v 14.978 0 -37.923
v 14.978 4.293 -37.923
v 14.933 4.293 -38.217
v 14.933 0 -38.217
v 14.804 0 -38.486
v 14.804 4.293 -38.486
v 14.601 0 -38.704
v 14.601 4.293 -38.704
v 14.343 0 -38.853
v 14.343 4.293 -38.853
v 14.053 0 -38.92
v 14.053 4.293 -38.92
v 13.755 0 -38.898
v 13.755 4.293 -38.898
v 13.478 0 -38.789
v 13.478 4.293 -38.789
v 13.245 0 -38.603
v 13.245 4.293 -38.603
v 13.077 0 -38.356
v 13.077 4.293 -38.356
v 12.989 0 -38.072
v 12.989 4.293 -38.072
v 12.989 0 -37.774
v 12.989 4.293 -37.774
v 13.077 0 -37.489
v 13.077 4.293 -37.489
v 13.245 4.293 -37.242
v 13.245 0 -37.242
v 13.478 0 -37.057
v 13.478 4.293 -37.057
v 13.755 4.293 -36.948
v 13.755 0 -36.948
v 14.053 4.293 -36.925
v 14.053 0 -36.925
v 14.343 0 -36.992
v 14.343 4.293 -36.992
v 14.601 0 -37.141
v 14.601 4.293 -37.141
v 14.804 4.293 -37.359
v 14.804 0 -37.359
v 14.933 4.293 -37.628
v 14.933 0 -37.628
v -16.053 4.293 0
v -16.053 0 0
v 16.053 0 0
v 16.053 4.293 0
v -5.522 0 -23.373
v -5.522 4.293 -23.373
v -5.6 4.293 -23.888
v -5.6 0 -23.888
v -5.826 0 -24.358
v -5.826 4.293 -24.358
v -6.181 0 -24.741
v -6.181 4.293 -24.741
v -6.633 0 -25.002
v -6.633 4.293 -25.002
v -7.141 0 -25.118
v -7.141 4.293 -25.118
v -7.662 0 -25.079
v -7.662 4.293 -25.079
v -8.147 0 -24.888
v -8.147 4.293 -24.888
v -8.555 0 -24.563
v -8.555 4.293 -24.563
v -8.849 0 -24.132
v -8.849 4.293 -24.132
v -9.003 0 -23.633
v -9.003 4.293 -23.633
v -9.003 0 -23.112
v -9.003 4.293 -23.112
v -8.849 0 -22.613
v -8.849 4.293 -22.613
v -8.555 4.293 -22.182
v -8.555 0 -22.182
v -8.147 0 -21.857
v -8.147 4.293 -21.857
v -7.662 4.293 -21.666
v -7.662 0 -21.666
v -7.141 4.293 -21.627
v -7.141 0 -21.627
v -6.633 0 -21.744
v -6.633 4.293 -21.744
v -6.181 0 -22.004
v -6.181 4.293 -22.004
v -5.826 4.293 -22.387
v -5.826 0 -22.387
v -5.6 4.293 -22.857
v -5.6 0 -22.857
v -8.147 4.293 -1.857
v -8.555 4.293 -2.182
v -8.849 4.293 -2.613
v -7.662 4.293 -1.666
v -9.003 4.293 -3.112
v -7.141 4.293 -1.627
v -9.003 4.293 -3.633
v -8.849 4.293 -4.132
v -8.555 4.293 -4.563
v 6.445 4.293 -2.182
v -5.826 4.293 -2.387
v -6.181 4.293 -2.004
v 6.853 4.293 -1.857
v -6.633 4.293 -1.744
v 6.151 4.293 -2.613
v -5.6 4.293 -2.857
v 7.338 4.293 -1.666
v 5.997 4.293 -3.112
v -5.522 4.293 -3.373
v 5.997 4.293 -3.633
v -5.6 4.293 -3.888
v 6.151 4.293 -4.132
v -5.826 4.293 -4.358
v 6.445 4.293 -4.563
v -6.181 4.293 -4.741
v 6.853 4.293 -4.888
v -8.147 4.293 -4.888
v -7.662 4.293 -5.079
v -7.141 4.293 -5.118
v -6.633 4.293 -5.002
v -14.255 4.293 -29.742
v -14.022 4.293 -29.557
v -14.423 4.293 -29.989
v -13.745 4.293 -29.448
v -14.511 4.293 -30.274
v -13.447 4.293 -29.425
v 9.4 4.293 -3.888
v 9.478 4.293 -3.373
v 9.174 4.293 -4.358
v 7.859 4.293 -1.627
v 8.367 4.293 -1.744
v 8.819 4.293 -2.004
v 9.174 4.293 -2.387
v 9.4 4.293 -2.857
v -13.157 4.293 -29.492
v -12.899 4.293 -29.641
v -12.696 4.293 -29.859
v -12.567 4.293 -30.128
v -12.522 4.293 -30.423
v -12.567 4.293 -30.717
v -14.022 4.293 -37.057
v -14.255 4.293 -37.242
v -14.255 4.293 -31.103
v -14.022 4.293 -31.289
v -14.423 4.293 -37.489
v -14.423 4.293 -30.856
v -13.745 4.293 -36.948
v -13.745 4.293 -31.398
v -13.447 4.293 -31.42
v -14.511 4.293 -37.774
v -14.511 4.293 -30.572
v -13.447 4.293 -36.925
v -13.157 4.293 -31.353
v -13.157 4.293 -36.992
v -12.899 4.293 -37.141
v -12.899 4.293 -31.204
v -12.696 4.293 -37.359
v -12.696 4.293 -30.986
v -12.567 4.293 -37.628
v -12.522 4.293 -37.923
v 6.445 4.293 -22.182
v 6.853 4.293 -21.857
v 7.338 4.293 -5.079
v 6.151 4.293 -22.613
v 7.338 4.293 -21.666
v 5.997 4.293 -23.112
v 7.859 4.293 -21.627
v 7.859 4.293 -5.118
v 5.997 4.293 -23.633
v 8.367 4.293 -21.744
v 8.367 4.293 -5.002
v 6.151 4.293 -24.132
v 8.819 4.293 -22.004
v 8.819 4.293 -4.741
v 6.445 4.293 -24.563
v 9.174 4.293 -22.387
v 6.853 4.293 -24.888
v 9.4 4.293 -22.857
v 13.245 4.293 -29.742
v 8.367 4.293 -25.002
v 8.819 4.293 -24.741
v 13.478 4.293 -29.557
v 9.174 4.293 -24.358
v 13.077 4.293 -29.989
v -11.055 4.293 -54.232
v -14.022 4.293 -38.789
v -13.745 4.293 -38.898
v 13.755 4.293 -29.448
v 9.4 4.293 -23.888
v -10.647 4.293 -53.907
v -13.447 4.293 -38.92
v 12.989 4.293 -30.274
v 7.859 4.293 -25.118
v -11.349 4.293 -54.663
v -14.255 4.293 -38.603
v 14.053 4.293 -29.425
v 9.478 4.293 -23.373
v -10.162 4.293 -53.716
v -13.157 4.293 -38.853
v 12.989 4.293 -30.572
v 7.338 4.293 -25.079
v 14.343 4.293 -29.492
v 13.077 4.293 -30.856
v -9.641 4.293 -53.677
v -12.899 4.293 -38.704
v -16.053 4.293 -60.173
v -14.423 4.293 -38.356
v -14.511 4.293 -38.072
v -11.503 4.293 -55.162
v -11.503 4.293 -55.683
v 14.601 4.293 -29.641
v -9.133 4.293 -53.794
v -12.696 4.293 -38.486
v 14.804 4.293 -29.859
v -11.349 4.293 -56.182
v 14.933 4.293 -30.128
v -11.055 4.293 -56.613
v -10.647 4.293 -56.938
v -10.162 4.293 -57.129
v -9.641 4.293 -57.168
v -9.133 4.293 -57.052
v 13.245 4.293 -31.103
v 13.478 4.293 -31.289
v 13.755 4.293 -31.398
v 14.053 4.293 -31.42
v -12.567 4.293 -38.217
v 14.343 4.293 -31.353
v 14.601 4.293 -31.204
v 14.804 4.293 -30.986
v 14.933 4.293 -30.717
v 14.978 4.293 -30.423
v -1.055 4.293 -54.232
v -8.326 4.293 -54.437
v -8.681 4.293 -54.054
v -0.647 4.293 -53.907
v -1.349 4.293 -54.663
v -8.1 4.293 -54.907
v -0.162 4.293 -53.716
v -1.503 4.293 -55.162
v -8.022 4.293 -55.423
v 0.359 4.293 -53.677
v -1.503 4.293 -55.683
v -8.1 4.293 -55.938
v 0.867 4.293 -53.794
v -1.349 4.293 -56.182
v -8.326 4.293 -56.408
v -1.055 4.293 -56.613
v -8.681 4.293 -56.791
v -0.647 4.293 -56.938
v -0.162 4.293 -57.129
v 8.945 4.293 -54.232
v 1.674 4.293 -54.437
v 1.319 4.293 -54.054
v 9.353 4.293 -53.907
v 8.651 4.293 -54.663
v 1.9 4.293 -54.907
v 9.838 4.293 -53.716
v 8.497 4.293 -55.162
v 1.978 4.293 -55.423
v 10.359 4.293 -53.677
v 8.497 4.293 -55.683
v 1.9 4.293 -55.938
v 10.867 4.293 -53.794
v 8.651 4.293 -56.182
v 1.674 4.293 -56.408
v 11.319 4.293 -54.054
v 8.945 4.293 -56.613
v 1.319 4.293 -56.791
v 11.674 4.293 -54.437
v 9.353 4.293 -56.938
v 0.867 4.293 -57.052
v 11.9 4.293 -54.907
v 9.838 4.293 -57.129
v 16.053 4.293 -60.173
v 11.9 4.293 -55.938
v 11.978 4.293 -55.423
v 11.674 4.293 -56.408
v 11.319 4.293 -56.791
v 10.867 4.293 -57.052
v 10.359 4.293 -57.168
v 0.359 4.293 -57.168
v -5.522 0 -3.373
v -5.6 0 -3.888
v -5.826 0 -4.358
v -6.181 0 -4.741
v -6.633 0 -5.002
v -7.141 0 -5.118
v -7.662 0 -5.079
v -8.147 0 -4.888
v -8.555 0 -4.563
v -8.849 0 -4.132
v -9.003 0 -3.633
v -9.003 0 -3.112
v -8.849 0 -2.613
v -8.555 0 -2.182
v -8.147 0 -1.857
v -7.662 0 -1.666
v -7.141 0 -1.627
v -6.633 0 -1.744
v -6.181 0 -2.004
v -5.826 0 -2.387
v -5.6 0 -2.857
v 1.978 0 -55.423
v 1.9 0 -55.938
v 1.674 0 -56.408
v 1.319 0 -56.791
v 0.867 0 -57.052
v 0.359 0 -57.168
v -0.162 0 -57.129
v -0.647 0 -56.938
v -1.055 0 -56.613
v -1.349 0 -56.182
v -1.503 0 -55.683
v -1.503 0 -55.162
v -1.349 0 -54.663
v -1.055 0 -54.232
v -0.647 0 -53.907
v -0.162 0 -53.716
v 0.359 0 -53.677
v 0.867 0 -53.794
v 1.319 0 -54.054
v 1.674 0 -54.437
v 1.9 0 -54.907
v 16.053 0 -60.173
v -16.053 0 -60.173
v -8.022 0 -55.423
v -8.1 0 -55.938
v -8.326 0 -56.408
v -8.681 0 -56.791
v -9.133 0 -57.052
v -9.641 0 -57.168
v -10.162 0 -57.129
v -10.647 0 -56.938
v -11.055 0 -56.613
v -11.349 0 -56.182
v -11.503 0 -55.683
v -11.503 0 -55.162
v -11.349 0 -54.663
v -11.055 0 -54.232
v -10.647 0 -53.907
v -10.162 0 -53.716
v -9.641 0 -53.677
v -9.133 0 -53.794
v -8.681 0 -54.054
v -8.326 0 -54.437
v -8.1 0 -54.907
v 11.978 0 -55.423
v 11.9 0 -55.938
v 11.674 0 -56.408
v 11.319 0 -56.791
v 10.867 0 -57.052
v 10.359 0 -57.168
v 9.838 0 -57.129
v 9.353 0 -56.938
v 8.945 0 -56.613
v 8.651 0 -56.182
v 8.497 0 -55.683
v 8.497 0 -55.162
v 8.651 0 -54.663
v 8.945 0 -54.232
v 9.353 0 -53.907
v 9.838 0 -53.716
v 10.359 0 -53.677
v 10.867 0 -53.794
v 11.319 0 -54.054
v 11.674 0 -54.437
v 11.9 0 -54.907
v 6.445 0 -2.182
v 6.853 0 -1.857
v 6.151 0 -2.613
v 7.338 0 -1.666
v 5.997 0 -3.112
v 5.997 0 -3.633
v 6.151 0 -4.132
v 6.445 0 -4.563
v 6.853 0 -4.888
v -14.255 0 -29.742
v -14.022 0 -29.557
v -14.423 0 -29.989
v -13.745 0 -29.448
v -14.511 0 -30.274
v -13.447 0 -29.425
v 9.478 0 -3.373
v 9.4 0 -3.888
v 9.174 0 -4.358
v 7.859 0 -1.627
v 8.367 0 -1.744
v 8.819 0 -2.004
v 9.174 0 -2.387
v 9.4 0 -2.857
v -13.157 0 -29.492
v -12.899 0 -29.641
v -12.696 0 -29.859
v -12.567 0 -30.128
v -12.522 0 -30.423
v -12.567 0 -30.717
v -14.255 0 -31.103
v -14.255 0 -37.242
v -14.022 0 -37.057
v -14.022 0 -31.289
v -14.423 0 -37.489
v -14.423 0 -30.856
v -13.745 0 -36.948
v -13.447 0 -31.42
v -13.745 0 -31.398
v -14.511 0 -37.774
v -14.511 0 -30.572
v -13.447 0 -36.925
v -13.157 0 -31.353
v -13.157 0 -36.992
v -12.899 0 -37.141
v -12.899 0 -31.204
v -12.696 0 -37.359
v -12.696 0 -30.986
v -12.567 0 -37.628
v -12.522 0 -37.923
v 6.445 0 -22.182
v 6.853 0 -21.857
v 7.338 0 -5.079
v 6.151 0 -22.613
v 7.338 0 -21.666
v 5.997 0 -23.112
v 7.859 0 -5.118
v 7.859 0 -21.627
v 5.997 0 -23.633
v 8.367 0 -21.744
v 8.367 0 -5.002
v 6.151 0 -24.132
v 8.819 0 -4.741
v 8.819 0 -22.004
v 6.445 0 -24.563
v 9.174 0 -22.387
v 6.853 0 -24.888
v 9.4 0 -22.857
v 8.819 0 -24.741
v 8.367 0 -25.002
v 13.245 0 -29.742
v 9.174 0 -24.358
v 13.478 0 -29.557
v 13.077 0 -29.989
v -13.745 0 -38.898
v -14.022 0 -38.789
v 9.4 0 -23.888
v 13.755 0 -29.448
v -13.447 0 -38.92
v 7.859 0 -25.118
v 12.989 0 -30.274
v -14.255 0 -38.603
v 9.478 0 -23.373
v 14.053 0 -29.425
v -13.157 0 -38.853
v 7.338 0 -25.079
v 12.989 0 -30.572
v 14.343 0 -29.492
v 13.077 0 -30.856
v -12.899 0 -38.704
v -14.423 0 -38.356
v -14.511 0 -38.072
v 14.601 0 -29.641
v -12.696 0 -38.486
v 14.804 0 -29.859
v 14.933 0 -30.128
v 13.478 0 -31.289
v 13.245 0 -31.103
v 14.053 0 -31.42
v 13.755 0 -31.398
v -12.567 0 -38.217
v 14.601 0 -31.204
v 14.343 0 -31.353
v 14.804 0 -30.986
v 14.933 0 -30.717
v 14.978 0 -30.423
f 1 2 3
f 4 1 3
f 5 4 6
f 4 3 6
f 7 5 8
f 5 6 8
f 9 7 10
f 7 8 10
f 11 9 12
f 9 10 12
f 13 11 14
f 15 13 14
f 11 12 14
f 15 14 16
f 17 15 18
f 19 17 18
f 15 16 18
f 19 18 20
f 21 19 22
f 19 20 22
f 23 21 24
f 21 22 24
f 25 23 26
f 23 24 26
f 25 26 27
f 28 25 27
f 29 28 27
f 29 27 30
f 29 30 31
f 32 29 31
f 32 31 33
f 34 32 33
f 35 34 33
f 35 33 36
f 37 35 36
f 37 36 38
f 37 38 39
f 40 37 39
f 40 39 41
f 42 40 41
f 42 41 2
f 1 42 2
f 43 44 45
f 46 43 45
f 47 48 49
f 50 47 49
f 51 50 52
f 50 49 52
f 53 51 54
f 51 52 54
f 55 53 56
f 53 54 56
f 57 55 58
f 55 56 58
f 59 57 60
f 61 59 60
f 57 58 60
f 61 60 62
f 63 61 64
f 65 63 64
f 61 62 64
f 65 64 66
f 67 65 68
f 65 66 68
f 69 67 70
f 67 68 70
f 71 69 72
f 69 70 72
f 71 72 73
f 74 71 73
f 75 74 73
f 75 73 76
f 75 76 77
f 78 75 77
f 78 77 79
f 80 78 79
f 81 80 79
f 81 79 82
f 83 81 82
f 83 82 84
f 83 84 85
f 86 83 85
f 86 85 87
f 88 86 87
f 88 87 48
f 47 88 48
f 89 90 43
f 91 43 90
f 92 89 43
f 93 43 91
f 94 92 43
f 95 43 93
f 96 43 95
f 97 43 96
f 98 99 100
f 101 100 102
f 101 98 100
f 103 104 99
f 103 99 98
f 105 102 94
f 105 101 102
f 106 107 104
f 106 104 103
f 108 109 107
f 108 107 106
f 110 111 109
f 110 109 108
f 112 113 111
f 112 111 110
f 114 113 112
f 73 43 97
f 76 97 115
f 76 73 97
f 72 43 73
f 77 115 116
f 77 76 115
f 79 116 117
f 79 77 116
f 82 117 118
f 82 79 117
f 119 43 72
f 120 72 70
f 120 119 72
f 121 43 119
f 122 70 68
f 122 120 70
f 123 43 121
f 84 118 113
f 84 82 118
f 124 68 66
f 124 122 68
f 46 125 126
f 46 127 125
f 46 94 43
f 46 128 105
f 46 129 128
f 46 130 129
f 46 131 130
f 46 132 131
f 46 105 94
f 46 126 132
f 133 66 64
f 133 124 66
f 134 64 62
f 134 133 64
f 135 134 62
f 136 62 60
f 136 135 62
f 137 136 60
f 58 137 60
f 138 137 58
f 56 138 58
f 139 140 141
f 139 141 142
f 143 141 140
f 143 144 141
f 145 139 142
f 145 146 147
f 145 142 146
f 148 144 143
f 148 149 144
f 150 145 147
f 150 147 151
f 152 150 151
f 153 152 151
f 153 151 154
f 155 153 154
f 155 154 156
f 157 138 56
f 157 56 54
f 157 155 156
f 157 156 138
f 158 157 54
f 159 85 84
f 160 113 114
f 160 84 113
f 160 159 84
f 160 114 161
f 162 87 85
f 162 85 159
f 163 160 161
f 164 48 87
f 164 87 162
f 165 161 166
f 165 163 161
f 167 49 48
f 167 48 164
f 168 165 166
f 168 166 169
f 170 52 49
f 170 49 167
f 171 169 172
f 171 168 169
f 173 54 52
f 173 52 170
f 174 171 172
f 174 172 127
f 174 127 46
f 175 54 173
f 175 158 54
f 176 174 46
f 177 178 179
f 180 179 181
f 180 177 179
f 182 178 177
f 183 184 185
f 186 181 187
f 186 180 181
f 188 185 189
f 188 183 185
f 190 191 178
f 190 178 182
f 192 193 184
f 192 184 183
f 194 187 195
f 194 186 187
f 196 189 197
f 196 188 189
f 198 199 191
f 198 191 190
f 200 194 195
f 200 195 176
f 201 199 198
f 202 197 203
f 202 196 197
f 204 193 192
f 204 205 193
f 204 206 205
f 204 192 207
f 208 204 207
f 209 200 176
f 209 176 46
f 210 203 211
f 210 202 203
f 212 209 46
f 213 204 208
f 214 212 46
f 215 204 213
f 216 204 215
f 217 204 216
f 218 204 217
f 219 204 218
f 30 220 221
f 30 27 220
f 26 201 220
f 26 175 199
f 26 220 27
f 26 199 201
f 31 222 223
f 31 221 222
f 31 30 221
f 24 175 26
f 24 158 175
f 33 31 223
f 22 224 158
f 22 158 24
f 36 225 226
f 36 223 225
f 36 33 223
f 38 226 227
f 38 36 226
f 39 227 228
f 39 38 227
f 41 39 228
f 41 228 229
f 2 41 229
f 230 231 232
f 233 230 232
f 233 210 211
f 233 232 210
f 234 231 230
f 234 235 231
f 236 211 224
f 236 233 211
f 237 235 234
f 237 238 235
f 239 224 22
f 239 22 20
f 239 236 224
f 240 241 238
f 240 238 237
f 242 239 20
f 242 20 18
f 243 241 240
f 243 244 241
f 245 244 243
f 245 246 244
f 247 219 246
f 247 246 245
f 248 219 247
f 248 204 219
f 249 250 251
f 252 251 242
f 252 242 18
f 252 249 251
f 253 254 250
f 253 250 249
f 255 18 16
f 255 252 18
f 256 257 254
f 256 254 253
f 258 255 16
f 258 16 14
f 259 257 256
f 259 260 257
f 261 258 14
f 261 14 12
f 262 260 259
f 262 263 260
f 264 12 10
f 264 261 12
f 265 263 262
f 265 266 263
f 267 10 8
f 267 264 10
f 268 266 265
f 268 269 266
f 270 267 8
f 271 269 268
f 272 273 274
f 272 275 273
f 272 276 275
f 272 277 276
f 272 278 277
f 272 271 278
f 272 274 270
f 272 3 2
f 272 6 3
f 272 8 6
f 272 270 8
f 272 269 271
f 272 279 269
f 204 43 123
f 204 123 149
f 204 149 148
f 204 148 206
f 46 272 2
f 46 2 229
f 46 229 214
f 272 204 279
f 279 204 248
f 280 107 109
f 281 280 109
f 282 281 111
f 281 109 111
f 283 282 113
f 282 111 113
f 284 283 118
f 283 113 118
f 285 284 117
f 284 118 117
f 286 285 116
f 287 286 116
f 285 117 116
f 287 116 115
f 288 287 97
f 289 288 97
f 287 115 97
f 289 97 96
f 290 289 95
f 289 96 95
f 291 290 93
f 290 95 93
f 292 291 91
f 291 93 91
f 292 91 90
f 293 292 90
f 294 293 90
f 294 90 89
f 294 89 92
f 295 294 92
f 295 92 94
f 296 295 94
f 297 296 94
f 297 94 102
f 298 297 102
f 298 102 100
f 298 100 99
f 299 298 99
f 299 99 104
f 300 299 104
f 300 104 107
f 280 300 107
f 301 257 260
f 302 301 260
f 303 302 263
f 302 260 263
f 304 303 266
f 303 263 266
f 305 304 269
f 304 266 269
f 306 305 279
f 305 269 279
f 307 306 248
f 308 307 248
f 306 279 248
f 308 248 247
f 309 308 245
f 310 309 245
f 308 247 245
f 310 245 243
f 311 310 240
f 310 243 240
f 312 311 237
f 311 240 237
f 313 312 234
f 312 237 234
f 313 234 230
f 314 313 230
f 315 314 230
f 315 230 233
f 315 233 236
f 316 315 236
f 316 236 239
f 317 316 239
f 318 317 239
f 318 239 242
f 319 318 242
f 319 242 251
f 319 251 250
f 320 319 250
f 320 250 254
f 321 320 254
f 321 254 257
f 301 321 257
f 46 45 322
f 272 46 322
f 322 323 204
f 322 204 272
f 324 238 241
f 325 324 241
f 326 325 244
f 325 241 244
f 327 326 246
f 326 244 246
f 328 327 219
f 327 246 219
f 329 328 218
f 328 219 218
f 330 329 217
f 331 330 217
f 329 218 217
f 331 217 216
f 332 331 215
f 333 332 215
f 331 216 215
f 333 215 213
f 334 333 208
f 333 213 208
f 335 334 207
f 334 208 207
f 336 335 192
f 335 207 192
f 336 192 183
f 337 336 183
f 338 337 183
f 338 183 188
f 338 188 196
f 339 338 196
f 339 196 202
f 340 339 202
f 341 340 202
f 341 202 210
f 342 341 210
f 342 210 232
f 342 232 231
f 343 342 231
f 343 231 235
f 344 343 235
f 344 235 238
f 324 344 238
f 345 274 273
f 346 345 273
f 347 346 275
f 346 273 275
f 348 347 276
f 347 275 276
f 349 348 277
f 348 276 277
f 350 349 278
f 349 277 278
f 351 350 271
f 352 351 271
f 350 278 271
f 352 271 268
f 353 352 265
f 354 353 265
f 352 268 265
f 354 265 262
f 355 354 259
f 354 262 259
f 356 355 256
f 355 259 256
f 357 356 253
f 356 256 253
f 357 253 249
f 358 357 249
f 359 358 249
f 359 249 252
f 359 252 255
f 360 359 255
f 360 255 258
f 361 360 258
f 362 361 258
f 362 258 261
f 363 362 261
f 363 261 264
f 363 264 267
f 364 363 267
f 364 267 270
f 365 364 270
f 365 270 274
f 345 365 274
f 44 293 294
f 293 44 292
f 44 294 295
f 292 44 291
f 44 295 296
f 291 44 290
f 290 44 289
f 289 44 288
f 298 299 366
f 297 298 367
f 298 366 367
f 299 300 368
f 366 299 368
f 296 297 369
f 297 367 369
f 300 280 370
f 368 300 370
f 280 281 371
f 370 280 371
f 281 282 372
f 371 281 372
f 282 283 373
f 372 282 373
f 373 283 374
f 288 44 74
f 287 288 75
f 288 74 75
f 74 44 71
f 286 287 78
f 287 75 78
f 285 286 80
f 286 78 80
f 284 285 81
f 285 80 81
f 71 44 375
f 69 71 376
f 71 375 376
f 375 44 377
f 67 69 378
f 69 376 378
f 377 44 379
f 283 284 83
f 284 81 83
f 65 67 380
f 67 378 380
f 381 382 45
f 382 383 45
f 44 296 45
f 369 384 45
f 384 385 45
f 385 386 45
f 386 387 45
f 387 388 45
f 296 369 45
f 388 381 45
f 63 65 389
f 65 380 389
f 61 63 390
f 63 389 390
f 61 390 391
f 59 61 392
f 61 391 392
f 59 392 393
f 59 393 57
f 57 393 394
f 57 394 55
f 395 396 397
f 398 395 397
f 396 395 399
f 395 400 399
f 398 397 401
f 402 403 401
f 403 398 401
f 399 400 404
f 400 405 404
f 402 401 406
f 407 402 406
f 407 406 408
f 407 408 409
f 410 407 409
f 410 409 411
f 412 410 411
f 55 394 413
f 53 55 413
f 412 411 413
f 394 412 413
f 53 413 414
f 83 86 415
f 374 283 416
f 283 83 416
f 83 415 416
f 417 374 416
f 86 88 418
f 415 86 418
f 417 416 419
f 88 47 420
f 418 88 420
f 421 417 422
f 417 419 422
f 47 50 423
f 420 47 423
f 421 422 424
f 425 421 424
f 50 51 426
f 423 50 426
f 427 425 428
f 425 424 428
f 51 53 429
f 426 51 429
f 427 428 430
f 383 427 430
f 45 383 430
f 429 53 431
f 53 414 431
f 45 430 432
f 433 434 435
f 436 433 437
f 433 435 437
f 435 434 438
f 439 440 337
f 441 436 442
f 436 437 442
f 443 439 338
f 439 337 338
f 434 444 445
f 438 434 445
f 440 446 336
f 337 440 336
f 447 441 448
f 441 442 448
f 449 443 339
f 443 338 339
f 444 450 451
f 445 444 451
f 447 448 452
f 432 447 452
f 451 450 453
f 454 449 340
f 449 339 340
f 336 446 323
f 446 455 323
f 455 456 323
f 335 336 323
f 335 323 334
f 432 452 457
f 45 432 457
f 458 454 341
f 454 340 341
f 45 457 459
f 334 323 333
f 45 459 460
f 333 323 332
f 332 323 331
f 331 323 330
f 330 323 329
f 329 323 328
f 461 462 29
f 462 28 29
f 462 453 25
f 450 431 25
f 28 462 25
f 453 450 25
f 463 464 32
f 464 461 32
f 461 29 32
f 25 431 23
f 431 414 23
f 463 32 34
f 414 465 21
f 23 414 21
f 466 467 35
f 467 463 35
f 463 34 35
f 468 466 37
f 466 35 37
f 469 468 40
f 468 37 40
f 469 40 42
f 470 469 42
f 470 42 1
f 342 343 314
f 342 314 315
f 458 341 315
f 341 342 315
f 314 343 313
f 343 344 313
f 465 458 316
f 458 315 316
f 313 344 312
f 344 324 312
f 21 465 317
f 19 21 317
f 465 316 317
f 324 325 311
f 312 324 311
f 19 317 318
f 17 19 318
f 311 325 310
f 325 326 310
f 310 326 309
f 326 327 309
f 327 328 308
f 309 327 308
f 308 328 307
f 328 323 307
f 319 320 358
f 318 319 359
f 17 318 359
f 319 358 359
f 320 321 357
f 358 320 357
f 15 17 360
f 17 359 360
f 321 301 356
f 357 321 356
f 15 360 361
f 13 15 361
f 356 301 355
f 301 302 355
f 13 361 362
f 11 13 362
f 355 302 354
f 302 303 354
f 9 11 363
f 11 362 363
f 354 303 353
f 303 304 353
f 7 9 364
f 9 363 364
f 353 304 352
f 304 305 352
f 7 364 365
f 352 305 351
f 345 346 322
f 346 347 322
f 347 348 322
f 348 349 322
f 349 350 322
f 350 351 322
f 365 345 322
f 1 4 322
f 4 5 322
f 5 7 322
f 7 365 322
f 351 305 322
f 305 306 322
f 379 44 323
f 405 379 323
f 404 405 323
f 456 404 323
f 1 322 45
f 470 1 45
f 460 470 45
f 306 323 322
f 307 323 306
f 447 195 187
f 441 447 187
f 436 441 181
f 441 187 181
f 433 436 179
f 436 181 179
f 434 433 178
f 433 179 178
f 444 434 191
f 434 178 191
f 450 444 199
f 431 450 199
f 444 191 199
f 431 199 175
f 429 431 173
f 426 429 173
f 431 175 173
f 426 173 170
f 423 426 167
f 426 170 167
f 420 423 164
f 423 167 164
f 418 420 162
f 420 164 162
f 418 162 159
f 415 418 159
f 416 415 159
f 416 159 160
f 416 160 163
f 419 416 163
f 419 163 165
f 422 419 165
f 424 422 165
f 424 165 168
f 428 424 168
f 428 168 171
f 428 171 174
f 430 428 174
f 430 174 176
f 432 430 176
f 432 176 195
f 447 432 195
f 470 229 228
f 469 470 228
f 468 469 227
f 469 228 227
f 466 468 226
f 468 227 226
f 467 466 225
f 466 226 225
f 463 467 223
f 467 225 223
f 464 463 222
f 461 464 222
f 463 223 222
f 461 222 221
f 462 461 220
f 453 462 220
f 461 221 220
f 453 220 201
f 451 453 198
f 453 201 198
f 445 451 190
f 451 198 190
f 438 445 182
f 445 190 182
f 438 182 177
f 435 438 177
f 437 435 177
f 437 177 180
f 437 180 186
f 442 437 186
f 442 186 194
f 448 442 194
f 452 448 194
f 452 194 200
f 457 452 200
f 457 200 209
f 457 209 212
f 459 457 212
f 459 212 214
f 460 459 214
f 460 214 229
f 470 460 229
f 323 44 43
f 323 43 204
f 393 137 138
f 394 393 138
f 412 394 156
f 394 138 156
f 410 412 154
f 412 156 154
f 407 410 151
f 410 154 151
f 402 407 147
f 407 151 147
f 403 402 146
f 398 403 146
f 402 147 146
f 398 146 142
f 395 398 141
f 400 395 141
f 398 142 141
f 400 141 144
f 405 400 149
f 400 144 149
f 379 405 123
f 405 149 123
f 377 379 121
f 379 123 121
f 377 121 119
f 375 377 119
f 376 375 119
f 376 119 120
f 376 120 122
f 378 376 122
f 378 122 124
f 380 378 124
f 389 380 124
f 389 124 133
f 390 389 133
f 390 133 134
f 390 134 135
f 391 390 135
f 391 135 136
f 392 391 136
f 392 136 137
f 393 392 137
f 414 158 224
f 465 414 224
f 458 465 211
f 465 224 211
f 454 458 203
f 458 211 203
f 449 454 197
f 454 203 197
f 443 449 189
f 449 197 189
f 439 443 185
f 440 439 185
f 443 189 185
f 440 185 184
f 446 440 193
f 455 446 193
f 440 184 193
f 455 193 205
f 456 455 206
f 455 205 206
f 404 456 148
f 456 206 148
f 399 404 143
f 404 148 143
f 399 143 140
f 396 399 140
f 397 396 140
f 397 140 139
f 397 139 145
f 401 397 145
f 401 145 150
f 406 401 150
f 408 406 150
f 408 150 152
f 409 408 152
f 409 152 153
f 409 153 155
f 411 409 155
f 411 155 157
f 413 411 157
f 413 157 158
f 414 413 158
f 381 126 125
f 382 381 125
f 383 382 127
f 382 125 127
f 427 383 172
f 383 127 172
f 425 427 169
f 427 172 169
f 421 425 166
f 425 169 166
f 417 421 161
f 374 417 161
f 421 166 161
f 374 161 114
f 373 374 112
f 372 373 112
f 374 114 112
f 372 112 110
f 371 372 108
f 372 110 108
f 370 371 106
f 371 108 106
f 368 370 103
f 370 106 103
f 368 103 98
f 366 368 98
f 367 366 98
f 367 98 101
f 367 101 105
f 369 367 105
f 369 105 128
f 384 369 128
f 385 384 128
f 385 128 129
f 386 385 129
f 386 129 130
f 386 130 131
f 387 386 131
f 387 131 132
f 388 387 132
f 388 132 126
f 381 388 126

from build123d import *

# Parameters (mm, degrees)
SKETCH1_W           = 32.1056
SKETCH1_H           = 60.1726
BOSS_EXTRUDE1_DEPTH = 4.2926
SKETCH2_R           = 1.75
SKETCH2_R_2         = 1
CUT_EXTRUDE1_DEPTH  = 5.2926


with BuildPart() as part:
    # Sketch1 → Boss-Extrude1 (new body)
    with BuildSketch(Plane(origin=(0, 0, 0), x_dir=(1, 0, 0), z_dir=(0, 1, 0))):
        with Locations((0, 30.0863)):
            Rectangle(SKETCH1_W, SKETCH1_H)
    extrude(amount=BOSS_EXTRUDE1_DEPTH)

    # Sketch2 → Cut-Extrude1 (cut, through all)
    with BuildSketch(Plane(origin=(0, 4.2926, 0), x_dir=(1, 0, 0), z_dir=(0, 1, 0))):
        with Locations((-9.772224543, 55.4226)):
            Circle(SKETCH2_R)
        with Locations((0.227775457, 55.4226)):
            Circle(SKETCH2_R)
        with Locations((10.227775457, 55.4226)):
            Circle(SKETCH2_R)
        with Locations((-7.272224543, 3.3726)):
            Circle(SKETCH2_R)
        with Locations((-7.272224543, 23.3726)):
            Circle(SKETCH2_R)
        with Locations((7.727775457, 23.3726)):
            Circle(SKETCH2_R)
        with Locations((7.727775457, 3.3726)):
            Circle(SKETCH2_R)
        with Locations((13.977775457, 30.4226)):
            Circle(SKETCH2_R_2)
        with Locations((13.977775457, 37.9226)):
            Circle(SKETCH2_R_2)
        with Locations((-13.522224543, 37.9226)):
            Circle(SKETCH2_R_2)
        with Locations((-13.522224543, 30.4226)):
            Circle(SKETCH2_R_2)
    extrude(amount=-CUT_EXTRUDE1_DEPTH, mode=Mode.SUBTRACT)


solid = part.part
